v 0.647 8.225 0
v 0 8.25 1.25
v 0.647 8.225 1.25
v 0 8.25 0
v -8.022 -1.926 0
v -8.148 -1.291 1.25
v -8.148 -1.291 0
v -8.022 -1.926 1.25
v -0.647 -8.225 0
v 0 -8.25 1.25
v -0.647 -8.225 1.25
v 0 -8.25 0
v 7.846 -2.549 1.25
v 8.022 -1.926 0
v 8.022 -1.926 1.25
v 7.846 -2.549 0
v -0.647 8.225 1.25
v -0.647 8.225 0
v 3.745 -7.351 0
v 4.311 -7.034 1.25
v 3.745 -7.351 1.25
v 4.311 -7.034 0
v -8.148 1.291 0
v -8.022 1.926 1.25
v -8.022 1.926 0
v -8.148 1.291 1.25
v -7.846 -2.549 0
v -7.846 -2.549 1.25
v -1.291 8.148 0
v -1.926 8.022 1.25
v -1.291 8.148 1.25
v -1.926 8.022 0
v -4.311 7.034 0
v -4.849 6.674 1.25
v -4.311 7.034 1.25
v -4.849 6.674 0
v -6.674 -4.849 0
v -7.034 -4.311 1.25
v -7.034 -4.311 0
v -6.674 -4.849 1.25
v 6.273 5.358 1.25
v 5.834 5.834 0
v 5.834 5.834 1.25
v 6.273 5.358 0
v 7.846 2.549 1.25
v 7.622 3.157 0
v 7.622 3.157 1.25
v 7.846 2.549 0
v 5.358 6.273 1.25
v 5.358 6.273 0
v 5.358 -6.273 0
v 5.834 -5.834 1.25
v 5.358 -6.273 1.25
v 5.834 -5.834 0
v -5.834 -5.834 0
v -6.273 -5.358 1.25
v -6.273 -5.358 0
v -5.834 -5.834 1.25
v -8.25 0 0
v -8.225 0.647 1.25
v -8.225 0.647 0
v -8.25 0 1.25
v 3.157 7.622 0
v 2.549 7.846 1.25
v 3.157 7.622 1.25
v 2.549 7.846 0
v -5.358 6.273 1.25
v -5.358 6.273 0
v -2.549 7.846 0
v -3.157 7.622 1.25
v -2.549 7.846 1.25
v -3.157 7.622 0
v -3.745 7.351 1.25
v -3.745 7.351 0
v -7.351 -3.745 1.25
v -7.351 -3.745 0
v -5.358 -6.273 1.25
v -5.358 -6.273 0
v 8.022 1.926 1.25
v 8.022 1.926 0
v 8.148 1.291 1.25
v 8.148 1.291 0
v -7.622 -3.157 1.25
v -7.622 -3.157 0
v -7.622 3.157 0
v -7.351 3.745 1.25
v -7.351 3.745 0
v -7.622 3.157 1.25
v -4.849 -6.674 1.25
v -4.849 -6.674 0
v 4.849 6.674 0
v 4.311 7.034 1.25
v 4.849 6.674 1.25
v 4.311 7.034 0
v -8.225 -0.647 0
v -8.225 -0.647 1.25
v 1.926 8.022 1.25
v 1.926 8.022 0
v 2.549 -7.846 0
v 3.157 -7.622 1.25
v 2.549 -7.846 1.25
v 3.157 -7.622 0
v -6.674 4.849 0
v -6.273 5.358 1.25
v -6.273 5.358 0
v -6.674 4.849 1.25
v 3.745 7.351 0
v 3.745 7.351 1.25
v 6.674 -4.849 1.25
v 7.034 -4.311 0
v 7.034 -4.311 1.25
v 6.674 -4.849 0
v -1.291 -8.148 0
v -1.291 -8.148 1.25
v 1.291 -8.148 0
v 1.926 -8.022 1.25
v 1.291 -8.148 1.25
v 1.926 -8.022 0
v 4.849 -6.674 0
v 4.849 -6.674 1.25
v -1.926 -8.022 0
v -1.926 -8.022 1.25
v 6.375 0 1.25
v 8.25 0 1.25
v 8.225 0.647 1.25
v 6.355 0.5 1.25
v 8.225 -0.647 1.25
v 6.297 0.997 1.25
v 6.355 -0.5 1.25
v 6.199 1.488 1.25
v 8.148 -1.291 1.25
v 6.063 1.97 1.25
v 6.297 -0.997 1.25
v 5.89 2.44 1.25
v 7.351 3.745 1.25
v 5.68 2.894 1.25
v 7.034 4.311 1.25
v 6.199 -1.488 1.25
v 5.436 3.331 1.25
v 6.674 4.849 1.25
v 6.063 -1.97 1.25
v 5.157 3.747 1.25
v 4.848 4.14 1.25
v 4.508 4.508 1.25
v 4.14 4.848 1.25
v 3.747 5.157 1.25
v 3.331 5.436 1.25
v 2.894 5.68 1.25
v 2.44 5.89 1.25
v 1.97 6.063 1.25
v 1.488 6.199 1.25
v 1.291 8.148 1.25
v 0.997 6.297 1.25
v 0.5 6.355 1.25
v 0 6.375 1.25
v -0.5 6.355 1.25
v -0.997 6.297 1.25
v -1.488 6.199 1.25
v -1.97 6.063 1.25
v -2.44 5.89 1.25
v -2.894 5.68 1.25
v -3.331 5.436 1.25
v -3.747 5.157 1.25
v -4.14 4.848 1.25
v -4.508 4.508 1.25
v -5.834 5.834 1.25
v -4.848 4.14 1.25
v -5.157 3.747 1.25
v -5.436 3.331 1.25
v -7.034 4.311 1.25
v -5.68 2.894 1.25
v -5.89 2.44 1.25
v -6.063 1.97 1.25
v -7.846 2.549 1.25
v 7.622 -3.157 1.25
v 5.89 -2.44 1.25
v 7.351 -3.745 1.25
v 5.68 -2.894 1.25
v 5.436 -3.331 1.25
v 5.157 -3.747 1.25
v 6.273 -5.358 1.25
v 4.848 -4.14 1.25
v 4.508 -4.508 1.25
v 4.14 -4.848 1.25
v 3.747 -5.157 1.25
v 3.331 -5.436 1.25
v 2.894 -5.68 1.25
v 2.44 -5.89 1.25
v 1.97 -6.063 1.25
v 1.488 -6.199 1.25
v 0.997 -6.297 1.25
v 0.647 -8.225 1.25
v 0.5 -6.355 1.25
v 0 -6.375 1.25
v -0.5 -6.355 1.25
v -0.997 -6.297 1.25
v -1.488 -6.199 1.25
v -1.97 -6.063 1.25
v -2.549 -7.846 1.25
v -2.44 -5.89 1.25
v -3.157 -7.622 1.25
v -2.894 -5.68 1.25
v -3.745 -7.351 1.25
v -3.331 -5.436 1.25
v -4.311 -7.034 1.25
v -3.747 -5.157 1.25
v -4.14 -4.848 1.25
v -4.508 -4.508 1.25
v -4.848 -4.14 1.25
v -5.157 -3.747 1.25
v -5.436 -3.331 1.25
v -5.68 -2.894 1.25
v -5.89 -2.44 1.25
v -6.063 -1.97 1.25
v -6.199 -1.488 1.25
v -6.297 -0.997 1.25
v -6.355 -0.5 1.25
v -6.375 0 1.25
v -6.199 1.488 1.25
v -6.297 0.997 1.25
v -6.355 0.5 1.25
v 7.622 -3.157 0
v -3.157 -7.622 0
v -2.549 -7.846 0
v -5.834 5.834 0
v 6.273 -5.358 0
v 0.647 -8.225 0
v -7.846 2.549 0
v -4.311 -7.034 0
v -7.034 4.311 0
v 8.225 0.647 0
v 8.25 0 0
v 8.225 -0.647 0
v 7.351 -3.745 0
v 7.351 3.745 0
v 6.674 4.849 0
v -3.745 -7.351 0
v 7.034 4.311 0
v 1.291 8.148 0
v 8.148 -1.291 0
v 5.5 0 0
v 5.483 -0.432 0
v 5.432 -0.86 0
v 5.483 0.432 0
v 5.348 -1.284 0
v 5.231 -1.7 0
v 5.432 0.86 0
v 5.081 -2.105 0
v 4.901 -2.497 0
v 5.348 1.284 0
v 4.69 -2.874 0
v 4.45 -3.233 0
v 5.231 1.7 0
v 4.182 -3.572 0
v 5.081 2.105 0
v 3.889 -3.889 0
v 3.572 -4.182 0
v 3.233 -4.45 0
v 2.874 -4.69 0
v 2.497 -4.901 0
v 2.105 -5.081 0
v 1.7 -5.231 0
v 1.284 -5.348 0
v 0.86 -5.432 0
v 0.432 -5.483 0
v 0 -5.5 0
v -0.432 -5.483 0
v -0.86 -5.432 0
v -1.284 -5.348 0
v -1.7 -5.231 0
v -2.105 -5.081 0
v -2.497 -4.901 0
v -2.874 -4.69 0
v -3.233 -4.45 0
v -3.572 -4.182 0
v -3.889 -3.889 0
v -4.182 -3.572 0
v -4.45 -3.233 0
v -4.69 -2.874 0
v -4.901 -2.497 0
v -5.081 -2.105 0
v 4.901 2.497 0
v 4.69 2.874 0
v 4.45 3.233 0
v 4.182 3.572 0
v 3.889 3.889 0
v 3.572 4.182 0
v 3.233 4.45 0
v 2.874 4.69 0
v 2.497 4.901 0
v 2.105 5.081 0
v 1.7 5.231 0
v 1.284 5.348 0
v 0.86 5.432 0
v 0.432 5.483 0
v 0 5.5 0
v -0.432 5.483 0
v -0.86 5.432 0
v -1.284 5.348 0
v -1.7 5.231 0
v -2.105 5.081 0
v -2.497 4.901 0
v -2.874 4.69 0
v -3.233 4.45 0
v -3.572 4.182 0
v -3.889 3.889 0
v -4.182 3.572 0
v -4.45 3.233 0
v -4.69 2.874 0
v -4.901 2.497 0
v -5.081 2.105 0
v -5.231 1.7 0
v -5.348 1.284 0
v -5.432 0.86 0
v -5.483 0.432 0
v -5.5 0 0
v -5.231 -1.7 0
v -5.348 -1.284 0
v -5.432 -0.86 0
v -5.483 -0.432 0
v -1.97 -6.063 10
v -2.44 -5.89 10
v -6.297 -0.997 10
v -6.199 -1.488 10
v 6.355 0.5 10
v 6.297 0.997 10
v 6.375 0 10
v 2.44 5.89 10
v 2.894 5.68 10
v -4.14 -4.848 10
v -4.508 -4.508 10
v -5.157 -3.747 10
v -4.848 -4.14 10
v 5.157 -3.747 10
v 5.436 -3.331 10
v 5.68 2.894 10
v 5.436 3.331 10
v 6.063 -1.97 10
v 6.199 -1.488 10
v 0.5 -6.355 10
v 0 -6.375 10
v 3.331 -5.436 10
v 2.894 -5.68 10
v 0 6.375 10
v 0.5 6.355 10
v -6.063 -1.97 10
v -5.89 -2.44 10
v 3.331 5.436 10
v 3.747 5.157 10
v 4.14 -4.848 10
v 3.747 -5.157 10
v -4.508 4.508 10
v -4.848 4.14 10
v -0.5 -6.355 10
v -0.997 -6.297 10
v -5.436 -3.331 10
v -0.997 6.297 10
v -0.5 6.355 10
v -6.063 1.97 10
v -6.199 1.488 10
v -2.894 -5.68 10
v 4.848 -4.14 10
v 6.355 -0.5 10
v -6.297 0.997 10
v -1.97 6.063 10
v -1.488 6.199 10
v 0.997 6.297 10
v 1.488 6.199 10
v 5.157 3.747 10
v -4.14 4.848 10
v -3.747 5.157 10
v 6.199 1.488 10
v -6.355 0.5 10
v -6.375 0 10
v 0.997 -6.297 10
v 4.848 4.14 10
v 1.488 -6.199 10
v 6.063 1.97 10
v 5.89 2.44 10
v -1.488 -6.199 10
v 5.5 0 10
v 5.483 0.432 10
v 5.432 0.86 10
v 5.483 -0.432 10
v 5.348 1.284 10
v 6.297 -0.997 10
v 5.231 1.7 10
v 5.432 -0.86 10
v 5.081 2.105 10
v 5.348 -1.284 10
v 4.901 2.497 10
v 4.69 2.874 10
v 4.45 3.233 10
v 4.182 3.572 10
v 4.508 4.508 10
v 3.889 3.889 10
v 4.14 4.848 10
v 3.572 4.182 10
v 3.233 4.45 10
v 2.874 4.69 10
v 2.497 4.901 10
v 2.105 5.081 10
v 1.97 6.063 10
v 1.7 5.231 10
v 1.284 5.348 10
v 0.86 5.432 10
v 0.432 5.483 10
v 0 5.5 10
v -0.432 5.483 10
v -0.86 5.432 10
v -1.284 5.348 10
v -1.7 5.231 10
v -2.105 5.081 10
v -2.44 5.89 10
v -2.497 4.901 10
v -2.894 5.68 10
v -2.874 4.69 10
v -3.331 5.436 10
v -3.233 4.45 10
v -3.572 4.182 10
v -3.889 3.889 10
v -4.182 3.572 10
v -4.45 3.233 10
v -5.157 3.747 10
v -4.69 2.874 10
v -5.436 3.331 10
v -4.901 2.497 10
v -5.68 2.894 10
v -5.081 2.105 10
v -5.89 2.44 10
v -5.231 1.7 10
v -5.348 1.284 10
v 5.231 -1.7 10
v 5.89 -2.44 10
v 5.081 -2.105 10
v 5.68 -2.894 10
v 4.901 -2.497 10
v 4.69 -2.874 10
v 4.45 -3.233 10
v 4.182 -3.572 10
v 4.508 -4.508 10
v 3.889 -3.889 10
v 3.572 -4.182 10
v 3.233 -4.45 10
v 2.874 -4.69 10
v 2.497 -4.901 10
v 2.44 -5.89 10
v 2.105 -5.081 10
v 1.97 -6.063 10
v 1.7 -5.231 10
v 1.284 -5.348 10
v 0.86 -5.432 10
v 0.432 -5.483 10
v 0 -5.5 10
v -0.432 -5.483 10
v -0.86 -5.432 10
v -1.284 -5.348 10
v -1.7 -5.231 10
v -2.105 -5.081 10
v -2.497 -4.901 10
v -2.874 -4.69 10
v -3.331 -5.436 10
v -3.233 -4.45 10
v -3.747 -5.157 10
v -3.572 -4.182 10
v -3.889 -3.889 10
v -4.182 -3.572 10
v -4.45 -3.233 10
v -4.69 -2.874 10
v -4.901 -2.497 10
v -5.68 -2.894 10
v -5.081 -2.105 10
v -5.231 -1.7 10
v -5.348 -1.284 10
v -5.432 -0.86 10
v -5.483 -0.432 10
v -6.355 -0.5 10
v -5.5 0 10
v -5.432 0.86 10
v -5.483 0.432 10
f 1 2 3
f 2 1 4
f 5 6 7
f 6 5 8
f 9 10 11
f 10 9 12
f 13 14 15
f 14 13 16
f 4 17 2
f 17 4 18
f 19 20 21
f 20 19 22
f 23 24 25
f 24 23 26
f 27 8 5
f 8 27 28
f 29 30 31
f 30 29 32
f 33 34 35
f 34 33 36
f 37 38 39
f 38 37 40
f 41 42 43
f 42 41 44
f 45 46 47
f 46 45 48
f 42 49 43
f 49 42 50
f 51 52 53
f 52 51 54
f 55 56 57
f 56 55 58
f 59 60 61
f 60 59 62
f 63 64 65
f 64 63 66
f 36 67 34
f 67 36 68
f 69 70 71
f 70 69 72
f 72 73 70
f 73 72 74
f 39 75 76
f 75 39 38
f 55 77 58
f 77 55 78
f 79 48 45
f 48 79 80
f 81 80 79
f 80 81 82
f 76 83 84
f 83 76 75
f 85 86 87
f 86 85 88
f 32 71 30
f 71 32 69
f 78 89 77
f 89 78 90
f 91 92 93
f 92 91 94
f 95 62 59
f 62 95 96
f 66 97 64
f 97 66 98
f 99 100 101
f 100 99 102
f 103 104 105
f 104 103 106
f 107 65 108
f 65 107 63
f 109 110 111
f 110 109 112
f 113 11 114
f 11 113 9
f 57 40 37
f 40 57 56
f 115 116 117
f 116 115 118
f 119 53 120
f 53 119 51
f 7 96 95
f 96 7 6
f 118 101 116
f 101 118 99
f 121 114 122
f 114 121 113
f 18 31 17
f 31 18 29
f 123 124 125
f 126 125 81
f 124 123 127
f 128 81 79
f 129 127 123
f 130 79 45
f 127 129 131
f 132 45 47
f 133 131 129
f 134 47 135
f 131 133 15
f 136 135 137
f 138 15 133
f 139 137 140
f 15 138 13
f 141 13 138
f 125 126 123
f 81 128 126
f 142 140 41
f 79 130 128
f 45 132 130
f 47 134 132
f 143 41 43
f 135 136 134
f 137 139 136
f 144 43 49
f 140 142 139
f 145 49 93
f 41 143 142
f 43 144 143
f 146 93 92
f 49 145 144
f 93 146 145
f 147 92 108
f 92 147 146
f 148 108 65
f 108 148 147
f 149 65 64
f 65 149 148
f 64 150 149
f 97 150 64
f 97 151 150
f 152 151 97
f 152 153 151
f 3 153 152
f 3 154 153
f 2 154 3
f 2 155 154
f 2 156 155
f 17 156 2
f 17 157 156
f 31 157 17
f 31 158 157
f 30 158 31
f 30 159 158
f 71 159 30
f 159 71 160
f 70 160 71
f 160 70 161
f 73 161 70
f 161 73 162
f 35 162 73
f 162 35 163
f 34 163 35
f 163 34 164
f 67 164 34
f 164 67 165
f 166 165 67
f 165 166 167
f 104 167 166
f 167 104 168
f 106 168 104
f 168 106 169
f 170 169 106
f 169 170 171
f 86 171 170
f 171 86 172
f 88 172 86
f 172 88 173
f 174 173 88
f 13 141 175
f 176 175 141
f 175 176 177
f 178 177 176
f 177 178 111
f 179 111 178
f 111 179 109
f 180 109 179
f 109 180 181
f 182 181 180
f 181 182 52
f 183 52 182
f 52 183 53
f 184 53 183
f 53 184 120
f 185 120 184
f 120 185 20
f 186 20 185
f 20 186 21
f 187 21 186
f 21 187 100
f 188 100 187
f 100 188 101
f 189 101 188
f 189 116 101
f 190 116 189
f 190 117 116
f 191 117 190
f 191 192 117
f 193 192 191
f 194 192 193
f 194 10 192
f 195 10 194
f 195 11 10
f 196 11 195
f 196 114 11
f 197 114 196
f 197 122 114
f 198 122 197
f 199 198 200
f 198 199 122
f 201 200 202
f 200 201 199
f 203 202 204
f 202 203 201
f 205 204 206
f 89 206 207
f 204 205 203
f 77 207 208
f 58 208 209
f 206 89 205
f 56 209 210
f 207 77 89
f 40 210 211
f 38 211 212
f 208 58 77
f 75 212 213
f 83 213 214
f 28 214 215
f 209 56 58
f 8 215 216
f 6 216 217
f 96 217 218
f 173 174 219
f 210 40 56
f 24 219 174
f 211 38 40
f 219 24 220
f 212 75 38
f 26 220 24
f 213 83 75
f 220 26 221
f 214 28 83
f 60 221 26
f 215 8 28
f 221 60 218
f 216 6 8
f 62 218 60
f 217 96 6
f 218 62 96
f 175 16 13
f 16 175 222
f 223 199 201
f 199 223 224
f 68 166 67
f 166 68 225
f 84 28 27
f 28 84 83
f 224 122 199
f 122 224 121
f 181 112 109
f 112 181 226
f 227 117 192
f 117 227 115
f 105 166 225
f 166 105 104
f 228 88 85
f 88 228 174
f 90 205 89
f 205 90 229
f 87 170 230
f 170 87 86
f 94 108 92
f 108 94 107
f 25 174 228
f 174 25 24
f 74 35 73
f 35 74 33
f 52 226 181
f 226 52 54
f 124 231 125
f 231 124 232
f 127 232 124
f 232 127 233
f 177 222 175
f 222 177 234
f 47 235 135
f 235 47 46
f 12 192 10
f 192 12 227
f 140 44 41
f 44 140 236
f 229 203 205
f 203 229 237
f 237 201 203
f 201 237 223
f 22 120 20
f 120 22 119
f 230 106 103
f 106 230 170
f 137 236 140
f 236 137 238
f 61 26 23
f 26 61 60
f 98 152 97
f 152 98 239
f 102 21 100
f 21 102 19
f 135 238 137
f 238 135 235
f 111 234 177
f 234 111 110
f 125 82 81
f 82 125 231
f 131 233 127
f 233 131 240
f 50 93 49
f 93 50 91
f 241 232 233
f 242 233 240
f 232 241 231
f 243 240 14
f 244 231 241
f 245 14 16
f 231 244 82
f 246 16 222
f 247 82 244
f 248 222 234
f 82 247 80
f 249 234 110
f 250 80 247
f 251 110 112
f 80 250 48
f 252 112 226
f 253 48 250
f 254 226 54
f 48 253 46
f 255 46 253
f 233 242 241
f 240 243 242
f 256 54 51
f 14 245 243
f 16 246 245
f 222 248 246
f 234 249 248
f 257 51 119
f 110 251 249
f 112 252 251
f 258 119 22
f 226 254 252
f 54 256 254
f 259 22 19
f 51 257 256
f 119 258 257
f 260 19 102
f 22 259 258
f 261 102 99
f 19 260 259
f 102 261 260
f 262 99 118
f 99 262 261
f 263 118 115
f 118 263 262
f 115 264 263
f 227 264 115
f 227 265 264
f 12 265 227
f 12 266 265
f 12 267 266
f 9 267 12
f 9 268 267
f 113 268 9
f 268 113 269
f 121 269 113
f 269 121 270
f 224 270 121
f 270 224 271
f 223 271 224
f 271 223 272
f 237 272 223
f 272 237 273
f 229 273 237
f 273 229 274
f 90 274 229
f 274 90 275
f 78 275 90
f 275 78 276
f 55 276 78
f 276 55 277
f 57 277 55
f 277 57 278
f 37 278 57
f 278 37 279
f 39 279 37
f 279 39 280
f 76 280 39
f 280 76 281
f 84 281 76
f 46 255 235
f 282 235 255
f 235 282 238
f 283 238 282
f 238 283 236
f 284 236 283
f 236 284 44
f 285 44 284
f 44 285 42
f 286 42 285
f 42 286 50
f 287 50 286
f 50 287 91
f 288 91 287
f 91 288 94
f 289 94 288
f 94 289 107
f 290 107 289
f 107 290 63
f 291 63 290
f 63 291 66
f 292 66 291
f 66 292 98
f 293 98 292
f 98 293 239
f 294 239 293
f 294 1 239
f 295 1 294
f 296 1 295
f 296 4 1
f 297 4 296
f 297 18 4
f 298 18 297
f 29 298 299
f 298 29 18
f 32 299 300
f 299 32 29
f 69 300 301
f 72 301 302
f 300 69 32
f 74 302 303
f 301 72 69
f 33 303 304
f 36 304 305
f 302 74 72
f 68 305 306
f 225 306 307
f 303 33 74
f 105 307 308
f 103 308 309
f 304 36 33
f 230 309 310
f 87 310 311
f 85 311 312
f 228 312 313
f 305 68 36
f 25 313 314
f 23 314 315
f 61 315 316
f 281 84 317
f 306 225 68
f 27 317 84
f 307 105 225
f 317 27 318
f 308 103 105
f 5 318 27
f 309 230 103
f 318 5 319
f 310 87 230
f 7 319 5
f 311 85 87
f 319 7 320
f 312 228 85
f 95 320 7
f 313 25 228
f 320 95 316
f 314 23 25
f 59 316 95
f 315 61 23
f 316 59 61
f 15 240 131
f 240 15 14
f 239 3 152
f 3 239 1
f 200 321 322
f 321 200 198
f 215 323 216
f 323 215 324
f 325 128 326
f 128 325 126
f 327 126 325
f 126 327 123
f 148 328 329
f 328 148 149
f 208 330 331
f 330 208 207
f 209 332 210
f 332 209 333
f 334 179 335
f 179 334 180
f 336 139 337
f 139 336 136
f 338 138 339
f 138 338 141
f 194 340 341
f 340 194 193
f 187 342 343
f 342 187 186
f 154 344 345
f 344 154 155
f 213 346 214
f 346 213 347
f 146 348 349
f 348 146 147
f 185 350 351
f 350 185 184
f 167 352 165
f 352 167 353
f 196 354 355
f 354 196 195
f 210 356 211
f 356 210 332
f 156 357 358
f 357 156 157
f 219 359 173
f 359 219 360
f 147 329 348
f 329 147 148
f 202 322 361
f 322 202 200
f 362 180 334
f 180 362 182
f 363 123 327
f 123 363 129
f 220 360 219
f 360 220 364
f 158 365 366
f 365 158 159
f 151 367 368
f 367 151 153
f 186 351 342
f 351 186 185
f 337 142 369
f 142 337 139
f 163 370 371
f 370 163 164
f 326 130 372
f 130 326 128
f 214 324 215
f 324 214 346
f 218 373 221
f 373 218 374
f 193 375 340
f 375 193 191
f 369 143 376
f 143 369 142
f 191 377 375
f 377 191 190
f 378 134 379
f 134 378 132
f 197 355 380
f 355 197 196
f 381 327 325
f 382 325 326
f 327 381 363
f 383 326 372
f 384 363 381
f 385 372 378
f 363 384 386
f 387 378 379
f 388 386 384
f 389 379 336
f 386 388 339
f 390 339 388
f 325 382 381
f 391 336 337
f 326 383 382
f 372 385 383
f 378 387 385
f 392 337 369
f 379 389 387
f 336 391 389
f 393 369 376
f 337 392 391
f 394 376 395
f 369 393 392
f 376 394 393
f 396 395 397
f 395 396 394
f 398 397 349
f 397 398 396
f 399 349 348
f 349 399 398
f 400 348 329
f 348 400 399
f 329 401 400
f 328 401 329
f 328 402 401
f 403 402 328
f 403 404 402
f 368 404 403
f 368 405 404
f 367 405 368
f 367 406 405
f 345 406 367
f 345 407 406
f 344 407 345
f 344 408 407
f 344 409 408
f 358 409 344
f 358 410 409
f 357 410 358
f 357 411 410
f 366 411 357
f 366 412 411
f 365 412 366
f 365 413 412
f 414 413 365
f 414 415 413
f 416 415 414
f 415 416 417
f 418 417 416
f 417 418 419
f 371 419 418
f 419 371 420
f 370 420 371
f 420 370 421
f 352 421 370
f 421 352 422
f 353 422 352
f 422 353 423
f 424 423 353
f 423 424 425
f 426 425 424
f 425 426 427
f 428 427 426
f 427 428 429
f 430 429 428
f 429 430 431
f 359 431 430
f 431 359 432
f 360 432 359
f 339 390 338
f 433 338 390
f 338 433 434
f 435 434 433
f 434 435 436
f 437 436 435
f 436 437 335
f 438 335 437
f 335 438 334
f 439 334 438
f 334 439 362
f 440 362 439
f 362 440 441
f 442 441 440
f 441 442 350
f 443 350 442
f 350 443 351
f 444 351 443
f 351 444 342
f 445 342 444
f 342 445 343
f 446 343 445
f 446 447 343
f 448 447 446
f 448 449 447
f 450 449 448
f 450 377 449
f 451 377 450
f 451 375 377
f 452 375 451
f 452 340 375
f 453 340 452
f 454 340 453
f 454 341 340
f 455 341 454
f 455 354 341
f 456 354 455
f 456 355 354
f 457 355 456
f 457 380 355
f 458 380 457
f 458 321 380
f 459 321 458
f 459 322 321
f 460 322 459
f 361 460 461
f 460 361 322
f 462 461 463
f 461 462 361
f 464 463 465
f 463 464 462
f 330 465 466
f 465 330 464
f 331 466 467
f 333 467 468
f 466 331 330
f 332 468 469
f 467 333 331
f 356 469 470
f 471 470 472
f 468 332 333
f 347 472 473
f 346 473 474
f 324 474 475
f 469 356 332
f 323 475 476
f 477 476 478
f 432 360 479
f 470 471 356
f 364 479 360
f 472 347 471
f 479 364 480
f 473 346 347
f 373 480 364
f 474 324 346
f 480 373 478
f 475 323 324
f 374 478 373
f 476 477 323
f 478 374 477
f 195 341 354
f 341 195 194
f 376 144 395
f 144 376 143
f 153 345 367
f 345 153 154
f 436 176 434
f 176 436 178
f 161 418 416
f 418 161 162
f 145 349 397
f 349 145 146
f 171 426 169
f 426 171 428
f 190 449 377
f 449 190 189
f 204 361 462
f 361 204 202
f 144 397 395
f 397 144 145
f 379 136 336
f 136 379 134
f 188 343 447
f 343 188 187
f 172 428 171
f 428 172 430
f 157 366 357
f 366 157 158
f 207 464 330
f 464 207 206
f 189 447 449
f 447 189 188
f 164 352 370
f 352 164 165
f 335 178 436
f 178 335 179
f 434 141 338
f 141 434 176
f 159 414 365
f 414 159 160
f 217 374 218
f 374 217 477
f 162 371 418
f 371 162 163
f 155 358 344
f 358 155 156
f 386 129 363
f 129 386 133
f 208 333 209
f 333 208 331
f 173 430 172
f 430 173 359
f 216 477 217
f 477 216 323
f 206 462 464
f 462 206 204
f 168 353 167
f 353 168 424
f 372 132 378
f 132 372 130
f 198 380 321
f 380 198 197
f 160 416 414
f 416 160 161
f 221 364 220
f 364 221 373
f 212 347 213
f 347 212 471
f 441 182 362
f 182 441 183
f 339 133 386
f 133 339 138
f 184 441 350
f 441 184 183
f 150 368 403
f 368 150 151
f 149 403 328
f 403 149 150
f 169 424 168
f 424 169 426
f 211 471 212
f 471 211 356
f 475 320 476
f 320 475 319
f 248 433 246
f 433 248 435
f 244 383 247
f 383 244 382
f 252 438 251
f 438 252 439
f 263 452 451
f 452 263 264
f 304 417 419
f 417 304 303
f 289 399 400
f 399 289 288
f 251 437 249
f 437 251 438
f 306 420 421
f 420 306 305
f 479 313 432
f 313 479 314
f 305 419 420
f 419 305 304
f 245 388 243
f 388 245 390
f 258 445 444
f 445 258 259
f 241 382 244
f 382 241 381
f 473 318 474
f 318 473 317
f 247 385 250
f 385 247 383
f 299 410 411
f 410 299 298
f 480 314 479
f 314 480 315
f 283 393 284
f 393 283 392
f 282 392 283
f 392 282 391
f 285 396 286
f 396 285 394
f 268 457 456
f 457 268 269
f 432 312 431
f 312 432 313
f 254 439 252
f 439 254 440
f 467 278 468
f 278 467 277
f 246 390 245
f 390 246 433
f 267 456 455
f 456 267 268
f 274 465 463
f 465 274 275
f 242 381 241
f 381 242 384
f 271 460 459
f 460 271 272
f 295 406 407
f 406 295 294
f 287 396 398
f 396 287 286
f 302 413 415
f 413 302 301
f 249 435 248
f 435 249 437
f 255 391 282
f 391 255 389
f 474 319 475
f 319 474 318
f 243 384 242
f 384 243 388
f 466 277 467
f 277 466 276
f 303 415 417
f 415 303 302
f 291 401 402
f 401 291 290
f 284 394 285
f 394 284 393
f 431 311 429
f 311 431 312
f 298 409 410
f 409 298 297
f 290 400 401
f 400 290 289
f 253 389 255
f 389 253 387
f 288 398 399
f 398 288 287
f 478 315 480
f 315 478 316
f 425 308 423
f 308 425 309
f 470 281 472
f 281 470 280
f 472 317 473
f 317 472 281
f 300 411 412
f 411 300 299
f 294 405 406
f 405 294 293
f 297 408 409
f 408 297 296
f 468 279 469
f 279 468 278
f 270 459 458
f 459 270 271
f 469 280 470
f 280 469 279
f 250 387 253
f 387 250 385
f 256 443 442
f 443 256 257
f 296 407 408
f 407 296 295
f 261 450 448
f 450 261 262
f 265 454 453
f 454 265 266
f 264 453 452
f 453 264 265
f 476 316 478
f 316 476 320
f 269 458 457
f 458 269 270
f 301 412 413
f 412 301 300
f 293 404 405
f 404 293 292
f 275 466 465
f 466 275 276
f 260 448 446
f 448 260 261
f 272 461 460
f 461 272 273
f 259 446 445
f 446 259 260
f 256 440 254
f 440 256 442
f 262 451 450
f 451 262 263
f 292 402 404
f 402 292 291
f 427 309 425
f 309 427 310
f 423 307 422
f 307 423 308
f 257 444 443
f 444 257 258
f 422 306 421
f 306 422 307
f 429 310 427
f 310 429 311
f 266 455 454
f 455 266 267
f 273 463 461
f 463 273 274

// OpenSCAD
// file: common.scad
// Measurements and routines common across adapters.

band_full_thickness = 1.25;    // thickest point of the band
band_full_diameter = 16.5;  // diameter at widest point of band

// profile = [
//     [0,0],
//     [band_edge_diameter / 2, 0],
//     [band_full_diameter / 2, (band_full_thickness - band_edge_thickness) / 2],
//     [band_full_diameter / 2, band_full_thickness - ((band_full_thickness - band_edge_thickness) / 2)],
//     [band_edge_diameter / 2, band_full_thickness],
//     [0,band_full_thickness],
// ];

profile = [
    [0,0],
    [band_full_diameter / 2, 0],
    [band_full_diameter / 2, band_full_thickness],
    [0,band_full_thickness],
];

module band() {
    rotate_extrude($fn=80) polygon(points=profile);
}
// main file
// Plotter pen adapter for Sharpie Fine Point markers
//
// Modified by Sasha Kovar <sasha-thing@arcocene.org>
// from a design by Brian Boucheron <brian@boucheron.org>

include <common.scad>;

body_outer_diameter = 12.75; // outer diameter of the main body
body_inner_diameter = 11; // inner diameter of the main body

difference() {
    union() {
        band();
        cylinder(r=body_outer_diameter/2, h=10, $fn=80);
    }
    translate([0,0,-25]) cylinder(r=body_inner_diameter/2, h=50, $fn=80);
}
